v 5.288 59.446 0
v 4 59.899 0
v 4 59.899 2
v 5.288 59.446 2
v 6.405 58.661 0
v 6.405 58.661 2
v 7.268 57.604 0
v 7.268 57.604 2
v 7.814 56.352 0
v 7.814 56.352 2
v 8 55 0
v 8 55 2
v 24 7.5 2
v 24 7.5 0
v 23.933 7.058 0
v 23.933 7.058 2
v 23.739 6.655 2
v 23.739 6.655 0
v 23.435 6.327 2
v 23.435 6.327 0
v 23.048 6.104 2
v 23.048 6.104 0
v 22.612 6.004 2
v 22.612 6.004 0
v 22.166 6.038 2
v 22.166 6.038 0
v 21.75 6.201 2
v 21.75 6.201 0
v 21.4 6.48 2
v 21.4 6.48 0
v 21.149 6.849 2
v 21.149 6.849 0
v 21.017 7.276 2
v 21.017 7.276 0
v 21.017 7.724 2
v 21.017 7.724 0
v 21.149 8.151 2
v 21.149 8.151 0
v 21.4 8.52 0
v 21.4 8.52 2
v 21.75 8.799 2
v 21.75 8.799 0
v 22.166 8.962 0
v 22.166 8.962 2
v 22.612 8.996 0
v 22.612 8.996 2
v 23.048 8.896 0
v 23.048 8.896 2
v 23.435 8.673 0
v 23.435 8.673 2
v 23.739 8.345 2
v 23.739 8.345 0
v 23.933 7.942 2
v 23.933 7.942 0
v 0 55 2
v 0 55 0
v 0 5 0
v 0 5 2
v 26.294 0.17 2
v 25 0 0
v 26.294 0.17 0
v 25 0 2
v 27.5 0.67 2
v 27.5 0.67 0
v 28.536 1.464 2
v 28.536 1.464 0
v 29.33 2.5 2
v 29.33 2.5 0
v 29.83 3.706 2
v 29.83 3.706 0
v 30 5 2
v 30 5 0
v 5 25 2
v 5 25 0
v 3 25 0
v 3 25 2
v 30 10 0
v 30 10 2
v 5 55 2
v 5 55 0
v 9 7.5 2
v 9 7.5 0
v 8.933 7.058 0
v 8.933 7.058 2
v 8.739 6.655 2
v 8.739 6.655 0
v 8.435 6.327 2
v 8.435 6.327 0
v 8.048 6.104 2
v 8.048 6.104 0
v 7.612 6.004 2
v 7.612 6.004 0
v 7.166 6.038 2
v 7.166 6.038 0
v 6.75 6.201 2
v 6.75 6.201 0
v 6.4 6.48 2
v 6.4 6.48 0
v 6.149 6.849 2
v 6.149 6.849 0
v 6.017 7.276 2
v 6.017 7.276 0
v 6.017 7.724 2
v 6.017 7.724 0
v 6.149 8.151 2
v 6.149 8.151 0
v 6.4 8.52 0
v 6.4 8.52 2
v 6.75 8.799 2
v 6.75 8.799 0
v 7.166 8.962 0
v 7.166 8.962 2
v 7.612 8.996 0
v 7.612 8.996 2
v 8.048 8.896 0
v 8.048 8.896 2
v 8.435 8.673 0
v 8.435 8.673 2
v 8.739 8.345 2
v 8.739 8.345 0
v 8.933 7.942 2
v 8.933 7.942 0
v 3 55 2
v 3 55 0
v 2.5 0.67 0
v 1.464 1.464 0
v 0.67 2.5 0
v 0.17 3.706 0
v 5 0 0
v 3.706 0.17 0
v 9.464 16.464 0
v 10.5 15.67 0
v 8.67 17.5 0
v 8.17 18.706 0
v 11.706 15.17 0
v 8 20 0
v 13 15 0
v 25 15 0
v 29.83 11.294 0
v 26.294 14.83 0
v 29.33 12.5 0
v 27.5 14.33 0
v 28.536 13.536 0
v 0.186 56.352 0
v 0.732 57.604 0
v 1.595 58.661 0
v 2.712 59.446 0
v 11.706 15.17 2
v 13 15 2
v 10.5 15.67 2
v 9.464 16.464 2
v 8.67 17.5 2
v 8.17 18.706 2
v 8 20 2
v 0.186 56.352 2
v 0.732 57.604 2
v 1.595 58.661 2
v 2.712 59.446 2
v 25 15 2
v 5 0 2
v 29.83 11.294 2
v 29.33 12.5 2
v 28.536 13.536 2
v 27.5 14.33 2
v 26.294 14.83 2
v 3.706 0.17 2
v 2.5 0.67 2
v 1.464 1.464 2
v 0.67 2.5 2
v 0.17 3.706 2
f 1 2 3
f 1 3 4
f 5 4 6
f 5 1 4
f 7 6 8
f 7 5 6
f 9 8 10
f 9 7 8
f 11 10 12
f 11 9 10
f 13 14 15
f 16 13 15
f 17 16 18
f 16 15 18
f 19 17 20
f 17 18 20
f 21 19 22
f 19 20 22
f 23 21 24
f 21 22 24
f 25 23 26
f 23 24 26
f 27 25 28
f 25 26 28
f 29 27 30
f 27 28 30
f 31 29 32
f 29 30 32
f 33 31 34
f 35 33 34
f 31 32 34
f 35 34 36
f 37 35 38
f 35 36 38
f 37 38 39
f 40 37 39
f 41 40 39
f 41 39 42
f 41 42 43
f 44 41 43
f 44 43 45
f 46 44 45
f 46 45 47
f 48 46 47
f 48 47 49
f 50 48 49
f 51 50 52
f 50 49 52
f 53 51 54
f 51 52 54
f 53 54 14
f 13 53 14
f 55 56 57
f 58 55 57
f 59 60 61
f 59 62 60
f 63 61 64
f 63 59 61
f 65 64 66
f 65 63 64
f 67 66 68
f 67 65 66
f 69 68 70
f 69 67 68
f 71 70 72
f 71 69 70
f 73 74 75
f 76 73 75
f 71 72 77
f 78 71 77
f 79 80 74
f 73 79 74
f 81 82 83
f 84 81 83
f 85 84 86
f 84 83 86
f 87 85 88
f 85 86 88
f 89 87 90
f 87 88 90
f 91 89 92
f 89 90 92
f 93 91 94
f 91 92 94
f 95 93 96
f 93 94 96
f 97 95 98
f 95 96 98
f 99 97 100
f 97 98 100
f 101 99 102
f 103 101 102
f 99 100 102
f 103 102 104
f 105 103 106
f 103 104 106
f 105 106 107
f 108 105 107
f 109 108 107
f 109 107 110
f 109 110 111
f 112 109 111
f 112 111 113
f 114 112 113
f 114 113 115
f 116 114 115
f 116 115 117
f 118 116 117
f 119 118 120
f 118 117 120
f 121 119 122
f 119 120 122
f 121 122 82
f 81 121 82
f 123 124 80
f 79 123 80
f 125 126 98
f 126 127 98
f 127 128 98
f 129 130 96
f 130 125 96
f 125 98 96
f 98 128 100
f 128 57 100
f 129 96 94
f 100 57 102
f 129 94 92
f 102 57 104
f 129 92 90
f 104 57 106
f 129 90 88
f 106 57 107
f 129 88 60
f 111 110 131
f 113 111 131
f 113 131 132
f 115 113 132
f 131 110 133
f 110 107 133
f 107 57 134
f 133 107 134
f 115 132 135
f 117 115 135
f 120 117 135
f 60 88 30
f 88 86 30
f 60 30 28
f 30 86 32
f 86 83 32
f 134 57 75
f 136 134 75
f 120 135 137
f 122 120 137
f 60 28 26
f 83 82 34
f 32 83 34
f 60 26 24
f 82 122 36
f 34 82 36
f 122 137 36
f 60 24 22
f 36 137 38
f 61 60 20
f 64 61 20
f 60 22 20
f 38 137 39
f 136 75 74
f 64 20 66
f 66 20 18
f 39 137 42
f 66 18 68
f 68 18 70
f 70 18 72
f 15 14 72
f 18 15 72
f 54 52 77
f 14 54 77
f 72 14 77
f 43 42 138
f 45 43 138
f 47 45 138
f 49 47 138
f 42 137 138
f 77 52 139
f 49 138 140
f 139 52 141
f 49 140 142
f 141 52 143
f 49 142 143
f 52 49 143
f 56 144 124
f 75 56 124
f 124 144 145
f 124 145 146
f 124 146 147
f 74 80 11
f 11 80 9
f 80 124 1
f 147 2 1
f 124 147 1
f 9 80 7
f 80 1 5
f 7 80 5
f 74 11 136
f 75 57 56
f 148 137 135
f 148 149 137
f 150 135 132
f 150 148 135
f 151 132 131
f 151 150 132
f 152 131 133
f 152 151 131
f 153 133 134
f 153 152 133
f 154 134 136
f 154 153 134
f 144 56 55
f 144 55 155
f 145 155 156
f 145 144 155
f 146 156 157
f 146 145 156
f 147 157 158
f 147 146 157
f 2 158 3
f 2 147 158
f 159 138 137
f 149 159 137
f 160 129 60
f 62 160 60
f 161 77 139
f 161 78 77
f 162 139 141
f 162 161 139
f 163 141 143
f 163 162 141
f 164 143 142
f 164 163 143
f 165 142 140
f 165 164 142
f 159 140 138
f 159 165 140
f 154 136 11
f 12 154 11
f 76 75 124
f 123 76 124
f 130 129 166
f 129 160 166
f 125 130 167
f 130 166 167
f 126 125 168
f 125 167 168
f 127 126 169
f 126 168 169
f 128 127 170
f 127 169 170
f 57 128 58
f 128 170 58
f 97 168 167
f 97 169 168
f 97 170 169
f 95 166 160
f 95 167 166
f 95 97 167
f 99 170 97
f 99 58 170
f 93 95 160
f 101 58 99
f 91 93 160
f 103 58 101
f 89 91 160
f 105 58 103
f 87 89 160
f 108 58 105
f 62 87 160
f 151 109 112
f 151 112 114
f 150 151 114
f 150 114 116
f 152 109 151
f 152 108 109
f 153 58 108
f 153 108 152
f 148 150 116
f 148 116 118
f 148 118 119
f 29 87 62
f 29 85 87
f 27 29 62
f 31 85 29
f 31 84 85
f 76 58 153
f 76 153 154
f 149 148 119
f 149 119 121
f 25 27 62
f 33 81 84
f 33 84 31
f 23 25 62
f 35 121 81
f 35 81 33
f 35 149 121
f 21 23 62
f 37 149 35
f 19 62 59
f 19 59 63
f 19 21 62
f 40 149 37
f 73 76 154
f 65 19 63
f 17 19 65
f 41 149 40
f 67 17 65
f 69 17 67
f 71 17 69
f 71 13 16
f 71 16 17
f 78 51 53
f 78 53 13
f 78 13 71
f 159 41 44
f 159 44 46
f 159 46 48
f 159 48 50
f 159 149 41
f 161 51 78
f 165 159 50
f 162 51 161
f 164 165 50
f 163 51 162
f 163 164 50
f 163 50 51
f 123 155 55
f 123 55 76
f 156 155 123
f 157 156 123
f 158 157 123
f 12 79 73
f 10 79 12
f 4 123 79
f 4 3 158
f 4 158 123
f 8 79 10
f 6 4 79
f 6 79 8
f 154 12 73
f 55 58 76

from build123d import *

# Parameters (mm, degrees)
F0_W        = 30
F0_H        = 5
F1_DEPTH    = 2
F2_R        = 5
F3_T1_DEPTH = 27


# Not quite as in the source:
# - a fillet or chamfer that OpenCascade refuses, or shapes differently, is made with other operations: its cross-section is extruded or revolved along the edge and cut away or added
# - a feature names something its author has since deleted; it is built from what else it names


with BuildPart() as f1:
    # F0 (on Top) → F1 (new body)
    with BuildSketch(Plane.XY):
        Polygon((0, 15), (0, 10), (30, 10), (30, 15), (8, 15), (4, 15), align=None)
        with Locations((15, 2.5)):
            Rectangle(F0_W, F0_H)
        with BuildLine():
            Line((0, 7.5), (0, 5))
            Line((0, 5), (30, 5))
            Line((30, 5), (30, 7.5))
            Line((30, 7.5), (24, 7.5))
            ThreePointArc((24, 7.5), (22.5, 6), (21, 7.5))
            Line((21, 7.5), (15, 7.5))
            Line((15, 7.5), (9, 7.5))
            ThreePointArc((9, 7.5), (7.5, 6), (6, 7.5))
            Line((6, 7.5), (0, 7.5))
        make_face()
        with BuildLine():
            Line((0, 10), (0, 7.5))
            Line((0, 7.5), (6, 7.5))
            ThreePointArc((6, 7.5), (7.5, 9), (9, 7.5))
            Line((9, 7.5), (15, 7.5))
            Line((15, 7.5), (21, 7.5))
            ThreePointArc((21, 7.5), (22.5, 9), (24, 7.5))
            Line((24, 7.5), (30, 7.5))
            Line((30, 7.5), (30, 10))
            Line((30, 10), (0, 10))
        make_face()
        Polygon((0, 60), (0, 15), (4, 15), (8, 15), (8, 60), align=None)
        Polygon((5, 25), (4, 25), (3, 25), (3, 55), (5, 55), align=None, mode=Mode.SUBTRACT)
    extrude(amount=F1_DEPTH)

    # F2
    f2_edges = [f1.edges().sort_by_distance(p)[0] for p in [
        (8, 15, 1),
        (30, 15, 1),
        (30, 0, 1),
        (0, 0, 1),
    ]]
    fillet(f2_edges, radius=F2_R)

    # F3: fillet of radius 5 on 2 edges, made by hand

    # F3_s2 → F3_t1 (cut)
    with BuildSketch(Plane.XY.offset(-12.5)):
        with BuildLine():
            ThreePointArc((3, 60), (6.5355339059, 58.5355339059), (8, 55))
            Line((8, 55), (8, 60))
            Line((8, 60), (3, 60))
        make_face()
        with BuildLine():
            ThreePointArc((0, 55), (1.4644660941, 58.5355339059), (5, 60))
            Line((5, 60), (0, 60))
            Line((0, 60), (0, 55))
        make_face()
    extrude(amount=F3_T1_DEPTH, mode=Mode.SUBTRACT)


solid = f1.part
